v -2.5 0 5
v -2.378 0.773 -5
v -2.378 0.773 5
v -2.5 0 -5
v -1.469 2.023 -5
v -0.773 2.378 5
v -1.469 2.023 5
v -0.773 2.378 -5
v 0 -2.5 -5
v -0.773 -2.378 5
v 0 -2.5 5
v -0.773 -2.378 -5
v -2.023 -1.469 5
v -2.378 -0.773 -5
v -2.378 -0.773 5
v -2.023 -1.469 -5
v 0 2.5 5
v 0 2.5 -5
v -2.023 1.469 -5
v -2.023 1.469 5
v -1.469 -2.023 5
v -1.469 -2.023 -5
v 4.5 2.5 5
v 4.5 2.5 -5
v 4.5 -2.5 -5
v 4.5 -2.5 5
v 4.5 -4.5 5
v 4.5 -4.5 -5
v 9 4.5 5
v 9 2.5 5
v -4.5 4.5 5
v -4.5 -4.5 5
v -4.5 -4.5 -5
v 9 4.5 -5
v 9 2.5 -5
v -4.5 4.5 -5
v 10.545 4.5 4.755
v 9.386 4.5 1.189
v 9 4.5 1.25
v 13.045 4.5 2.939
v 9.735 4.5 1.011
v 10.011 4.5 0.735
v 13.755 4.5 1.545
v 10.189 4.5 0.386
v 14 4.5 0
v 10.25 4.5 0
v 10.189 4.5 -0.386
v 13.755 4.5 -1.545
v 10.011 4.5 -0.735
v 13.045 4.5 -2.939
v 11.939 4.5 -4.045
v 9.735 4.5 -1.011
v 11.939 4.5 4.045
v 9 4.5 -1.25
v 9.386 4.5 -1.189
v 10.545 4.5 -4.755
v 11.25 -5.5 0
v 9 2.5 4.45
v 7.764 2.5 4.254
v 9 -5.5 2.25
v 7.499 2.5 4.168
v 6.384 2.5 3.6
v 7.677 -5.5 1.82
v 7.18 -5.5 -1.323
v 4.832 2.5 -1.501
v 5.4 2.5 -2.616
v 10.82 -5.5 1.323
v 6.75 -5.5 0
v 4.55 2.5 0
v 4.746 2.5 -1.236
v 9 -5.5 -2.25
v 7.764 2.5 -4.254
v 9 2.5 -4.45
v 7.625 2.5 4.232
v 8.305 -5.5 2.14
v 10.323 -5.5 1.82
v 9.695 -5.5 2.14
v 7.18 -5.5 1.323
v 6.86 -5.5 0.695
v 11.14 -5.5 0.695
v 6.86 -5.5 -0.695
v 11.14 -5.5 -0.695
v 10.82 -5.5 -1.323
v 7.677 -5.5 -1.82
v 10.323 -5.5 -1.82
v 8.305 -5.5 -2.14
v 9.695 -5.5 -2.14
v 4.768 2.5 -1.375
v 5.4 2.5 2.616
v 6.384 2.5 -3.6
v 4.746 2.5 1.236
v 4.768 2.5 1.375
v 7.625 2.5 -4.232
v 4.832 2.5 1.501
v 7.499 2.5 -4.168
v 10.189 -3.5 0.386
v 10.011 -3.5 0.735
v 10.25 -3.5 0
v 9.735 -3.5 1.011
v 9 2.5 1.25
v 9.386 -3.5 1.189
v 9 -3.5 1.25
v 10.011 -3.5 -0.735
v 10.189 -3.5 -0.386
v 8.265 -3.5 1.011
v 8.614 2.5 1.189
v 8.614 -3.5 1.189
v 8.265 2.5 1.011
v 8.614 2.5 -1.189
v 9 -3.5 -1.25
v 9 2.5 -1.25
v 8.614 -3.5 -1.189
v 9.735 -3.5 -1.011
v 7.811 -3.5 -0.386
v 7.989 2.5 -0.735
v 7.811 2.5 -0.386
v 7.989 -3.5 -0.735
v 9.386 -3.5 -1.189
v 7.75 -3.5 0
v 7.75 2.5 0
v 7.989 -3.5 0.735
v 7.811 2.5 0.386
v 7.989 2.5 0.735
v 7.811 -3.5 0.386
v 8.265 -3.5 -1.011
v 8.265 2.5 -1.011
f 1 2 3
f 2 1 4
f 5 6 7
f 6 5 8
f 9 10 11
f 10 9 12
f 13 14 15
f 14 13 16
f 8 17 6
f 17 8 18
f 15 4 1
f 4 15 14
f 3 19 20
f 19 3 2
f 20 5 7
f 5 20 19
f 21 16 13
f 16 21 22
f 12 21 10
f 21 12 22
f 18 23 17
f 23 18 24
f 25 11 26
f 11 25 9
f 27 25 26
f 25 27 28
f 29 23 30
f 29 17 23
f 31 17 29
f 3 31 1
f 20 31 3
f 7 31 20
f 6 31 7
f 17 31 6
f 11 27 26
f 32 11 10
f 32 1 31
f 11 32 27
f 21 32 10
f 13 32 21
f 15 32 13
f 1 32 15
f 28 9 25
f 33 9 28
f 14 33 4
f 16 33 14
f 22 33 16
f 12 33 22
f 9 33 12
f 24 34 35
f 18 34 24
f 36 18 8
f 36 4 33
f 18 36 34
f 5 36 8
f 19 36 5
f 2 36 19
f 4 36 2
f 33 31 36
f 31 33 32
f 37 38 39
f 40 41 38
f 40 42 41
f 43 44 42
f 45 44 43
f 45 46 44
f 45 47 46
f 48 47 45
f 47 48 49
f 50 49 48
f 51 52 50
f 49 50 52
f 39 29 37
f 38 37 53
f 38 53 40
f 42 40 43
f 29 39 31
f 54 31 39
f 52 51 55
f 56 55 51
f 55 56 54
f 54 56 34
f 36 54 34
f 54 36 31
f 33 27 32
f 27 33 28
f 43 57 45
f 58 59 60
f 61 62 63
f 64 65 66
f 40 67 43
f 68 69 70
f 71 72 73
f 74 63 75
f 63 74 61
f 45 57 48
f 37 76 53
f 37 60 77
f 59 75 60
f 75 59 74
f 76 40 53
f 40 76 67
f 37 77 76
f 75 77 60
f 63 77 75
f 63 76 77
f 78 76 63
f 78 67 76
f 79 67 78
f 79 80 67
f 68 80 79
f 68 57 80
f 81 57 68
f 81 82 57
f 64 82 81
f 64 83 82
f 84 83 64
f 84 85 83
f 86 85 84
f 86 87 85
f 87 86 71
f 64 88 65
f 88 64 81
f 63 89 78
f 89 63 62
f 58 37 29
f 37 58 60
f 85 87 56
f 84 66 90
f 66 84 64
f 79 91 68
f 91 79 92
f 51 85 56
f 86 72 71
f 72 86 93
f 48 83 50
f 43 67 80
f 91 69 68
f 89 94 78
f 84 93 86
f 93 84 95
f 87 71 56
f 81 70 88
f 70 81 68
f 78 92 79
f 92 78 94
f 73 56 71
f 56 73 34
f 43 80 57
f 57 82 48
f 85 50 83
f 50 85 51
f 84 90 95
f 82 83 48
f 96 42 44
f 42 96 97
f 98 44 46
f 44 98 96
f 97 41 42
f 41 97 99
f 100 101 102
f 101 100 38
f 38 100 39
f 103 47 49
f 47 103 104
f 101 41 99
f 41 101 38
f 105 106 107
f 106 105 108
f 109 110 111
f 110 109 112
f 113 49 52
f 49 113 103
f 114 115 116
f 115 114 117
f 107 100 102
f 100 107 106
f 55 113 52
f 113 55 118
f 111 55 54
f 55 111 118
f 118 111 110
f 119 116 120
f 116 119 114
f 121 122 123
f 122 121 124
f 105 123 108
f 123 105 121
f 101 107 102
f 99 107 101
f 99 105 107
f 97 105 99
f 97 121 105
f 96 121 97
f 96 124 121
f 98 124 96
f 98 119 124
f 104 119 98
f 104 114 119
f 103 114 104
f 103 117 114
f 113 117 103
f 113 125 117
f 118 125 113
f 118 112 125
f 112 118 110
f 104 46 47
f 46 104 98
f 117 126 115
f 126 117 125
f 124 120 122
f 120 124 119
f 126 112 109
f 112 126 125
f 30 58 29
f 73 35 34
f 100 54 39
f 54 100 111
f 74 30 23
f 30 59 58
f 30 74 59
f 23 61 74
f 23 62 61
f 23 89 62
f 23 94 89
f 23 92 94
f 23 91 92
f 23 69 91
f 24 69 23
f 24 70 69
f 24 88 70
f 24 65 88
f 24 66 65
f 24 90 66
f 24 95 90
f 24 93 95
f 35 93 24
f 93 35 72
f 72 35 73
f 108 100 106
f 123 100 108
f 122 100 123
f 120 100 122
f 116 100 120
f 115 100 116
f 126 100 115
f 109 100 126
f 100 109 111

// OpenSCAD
diametre_cable=5;
diam_vis = 2.5;
epaisseur = 2;

difference() {
    cube([diametre_cable+2*epaisseur,diametre_cable+2*epaisseur,10], center=true);
    union(){
    cylinder(d=diametre_cable, h=11, $fn=20, center=true);
        translate([diametre_cable/2,0,0])
    cube([diametre_cable,diametre_cable,11], center=true);
    }
}
translate([(diametre_cable+2*epaisseur),(diametre_cable+2*epaisseur-10)/2,0])
rotate([90,0,0])
difference(){
cylinder(d1=10, d2=diam_vis+epaisseur, h=10, $fn=20, center=true);
    translate([0,0,-epaisseur])
    cylinder(d=diam_vis, h=10, $fn=20, center=true);
}
translate([3*(diametre_cable+2*epaisseur)/4,(diametre_cable+epaisseur)/2,0])
cube([(diametre_cable+2*epaisseur)/2, epaisseur, 10], center=true);
